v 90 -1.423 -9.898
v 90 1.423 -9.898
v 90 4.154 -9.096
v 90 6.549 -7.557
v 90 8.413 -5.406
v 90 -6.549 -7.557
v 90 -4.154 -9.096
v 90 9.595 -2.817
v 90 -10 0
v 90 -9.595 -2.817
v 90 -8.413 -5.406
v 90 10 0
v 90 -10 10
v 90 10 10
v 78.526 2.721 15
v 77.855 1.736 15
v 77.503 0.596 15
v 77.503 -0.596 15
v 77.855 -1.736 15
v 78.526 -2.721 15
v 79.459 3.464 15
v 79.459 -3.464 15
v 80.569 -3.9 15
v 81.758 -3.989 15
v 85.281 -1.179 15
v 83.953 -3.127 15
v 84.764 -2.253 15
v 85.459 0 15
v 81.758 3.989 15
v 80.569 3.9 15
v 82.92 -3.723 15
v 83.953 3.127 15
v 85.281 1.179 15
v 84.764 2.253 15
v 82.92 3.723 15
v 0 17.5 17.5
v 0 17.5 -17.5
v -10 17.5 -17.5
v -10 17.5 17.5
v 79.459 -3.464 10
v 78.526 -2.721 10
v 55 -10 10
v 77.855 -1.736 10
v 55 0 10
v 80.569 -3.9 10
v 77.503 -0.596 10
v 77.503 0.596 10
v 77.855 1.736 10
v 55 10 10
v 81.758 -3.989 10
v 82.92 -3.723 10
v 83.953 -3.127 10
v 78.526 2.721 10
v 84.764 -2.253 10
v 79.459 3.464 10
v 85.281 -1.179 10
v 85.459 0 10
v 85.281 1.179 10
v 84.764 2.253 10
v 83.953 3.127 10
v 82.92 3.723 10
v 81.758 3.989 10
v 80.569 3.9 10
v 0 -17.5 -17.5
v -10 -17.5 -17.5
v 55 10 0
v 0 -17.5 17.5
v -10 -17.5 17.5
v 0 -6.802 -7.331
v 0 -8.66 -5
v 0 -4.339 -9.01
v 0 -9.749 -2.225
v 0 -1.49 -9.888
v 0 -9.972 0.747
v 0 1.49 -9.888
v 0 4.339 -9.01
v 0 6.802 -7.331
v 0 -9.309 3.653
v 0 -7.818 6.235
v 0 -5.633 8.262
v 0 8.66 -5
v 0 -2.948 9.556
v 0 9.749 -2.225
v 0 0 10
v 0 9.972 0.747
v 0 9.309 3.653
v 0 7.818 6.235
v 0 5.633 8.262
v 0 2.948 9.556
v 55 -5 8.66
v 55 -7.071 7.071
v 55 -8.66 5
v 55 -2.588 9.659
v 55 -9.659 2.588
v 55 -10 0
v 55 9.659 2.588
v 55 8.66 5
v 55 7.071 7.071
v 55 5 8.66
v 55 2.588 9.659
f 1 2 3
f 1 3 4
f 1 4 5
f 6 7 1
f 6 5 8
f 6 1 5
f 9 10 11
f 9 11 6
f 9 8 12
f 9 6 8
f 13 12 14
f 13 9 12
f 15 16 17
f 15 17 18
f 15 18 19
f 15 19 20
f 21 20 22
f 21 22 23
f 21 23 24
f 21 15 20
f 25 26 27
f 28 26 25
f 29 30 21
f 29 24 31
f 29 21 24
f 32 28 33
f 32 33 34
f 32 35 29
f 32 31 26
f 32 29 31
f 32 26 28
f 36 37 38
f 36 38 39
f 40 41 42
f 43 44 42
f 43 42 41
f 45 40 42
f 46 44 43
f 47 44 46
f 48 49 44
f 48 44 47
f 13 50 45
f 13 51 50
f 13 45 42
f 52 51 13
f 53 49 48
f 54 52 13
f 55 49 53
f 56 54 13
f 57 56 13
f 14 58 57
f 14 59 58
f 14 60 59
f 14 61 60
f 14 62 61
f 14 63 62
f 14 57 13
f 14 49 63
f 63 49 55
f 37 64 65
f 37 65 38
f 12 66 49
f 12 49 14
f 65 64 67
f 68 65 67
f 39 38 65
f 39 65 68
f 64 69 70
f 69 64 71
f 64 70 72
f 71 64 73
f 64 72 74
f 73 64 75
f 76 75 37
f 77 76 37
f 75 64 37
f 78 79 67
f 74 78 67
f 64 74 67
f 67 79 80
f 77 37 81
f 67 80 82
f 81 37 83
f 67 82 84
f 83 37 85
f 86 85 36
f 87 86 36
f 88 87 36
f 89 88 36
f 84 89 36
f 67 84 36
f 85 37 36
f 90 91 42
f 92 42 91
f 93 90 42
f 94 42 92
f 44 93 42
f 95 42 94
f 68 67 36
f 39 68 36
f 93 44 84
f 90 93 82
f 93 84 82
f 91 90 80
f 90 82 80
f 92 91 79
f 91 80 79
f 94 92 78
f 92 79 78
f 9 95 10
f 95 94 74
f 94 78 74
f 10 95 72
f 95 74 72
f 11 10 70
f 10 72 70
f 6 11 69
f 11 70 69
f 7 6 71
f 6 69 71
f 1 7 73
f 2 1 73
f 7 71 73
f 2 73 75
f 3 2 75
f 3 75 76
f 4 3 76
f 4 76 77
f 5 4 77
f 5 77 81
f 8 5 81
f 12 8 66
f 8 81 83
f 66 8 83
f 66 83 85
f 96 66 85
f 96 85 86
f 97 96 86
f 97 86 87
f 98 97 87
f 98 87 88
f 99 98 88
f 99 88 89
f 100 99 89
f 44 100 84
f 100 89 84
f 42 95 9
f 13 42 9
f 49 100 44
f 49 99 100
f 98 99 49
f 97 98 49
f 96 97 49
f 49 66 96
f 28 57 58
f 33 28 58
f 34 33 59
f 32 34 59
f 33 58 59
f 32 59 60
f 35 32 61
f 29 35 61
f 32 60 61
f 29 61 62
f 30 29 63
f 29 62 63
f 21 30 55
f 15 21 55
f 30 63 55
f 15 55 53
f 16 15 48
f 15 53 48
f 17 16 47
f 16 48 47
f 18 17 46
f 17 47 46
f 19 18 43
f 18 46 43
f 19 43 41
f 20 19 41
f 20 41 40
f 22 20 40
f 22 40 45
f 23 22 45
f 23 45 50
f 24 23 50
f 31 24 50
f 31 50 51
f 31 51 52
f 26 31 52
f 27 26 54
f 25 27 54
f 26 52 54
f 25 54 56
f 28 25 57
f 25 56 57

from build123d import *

# Parameters (mm, degrees)
SKETCH_1_R      = 10
EXTRUDE_1_DEPTH = 90
SKETCH_2_W      = 35
SKETCH_2_H      = 20
EXTRUDE_2_DEPTH = 10
SKETCH_3_R      = 4
EXTRUDE_3_DEPTH = 5
SKETCH_5_W      = 35
SKETCH_5_H      = 35
EXTRUDE_4_DEPTH = 10


with BuildPart() as part:
    # 草图1 → 凸台-拉伸1 (new body)
    with BuildSketch(Plane(origin=(0, 0, 0), x_dir=(0, 0, -1), z_dir=(1, 0, 0))):
        with Locations(Location((0, 0, 0), (0, 0, 180))):
            Circle(SKETCH_1_R)
    extrude(amount=EXTRUDE_1_DEPTH)

    # 草图2 → 凸台-拉伸2 (add)
    with BuildSketch(Plane.XY):
        with Locations((72.5, 0)):
            Rectangle(SKETCH_2_W, SKETCH_2_H)
    extrude(amount=EXTRUDE_2_DEPTH)

    # 草图3 → 凸台-拉伸3 (add)
    with BuildSketch(Plane.XY.offset(10)):
        with Locations((81.45858647, 0)):
            Circle(SKETCH_3_R)
    extrude(amount=EXTRUDE_3_DEPTH)

    # 草图5 → 凸台-拉伸4 (add)
    with BuildSketch(Plane.ZY):
        Rectangle(SKETCH_5_W, SKETCH_5_H)
    extrude(amount=EXTRUDE_4_DEPTH)


solid = part.part
